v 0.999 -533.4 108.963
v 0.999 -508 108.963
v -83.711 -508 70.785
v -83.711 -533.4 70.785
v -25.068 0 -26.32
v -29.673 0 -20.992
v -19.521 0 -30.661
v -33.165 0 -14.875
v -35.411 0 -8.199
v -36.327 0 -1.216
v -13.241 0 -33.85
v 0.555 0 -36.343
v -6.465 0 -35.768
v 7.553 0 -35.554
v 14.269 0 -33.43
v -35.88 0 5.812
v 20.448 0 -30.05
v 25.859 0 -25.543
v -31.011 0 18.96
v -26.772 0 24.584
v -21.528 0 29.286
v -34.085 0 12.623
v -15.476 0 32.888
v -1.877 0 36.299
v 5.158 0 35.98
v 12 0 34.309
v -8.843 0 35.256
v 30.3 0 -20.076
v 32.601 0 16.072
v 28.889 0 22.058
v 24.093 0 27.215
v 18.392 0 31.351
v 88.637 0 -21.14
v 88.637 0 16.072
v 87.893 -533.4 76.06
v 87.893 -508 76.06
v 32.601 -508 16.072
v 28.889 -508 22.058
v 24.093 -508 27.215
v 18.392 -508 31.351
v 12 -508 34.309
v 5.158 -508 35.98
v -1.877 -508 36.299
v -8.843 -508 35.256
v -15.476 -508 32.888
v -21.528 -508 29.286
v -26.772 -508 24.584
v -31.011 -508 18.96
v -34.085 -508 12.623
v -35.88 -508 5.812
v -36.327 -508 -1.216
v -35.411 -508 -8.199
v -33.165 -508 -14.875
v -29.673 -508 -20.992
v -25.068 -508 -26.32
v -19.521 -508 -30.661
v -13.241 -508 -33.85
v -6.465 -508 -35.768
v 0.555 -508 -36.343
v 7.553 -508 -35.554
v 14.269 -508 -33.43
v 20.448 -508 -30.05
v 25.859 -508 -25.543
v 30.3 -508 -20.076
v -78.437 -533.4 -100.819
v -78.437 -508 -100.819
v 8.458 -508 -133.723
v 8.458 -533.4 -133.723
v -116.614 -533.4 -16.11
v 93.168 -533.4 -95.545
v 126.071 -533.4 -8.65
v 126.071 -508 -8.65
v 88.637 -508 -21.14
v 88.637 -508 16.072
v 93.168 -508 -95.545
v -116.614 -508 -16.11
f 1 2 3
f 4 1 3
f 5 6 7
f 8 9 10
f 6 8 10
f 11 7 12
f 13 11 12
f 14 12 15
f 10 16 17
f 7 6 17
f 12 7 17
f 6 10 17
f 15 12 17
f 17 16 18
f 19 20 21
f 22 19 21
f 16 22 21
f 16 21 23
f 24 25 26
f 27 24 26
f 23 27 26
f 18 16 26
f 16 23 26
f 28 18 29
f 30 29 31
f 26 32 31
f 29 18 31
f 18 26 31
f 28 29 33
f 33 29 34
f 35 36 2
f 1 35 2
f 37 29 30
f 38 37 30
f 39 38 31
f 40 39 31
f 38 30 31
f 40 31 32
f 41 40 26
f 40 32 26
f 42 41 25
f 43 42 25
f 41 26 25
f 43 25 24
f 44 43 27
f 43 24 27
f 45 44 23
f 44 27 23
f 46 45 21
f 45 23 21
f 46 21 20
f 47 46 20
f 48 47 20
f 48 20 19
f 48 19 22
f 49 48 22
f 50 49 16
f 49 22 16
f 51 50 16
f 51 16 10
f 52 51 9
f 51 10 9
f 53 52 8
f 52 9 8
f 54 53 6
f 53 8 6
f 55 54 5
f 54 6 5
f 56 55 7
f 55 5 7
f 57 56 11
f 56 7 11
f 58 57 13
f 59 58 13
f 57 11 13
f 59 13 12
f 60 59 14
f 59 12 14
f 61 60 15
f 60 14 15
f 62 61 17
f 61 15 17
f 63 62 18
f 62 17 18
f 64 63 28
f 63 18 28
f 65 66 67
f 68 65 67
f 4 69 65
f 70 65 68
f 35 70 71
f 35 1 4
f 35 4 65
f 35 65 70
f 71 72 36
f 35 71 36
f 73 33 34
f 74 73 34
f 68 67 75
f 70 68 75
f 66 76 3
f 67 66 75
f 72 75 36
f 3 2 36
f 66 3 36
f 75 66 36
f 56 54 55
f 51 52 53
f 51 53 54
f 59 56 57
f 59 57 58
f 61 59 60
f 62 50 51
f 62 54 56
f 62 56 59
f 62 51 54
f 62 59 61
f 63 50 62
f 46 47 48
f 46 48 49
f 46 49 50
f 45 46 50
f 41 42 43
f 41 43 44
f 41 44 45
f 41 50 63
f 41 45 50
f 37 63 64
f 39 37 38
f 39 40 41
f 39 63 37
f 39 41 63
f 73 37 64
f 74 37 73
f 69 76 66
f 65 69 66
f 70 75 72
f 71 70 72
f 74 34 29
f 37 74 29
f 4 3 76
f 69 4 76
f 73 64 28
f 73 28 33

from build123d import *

# Parameters (mm, degrees)
F1_DEPTH = 508
F4_DEPTH = 25.4


with BuildPart() as f1:
    # F0 (on Front) → F1 (new body)
    with BuildSketch(Plane.XZ):
        with BuildLine():
            Line((88.6366697668, 16.0722345858), (32.6010492352, 16.0722345858))
            ThreePointArc((32.6010492352, 16.0722345858), (-36.2741502146, 2.3089309281), (30.3001308518, -20.0760356193))
            Line((30.3001308518, -20.0760356193), (88.6366697668, -21.140081808))
            Line((88.6366697668, -21.140081808), (88.6366697668, 16.0722345858))
        make_face()
    extrude(amount=F1_DEPTH)


with BuildPart() as f4:
    # F3 (on offset) → F4 (new body)
    with BuildSketch(Plane.XZ.offset(508)):
        Polygon((-78.4366879534, -100.8194525046), (8.4579590629, -133.7226342159), (93.1678161276, -95.5449029725), (126.0709978389, -8.6502559562), (87.8932665955, 76.0596011085), (0.9986195792, 108.9627828198), (-83.7112374855, 70.7850515764), (-116.6144191968, -16.1095954399), align=None)
    extrude(amount=F4_DEPTH)


solid = Compound([f1.part, f4.part])
